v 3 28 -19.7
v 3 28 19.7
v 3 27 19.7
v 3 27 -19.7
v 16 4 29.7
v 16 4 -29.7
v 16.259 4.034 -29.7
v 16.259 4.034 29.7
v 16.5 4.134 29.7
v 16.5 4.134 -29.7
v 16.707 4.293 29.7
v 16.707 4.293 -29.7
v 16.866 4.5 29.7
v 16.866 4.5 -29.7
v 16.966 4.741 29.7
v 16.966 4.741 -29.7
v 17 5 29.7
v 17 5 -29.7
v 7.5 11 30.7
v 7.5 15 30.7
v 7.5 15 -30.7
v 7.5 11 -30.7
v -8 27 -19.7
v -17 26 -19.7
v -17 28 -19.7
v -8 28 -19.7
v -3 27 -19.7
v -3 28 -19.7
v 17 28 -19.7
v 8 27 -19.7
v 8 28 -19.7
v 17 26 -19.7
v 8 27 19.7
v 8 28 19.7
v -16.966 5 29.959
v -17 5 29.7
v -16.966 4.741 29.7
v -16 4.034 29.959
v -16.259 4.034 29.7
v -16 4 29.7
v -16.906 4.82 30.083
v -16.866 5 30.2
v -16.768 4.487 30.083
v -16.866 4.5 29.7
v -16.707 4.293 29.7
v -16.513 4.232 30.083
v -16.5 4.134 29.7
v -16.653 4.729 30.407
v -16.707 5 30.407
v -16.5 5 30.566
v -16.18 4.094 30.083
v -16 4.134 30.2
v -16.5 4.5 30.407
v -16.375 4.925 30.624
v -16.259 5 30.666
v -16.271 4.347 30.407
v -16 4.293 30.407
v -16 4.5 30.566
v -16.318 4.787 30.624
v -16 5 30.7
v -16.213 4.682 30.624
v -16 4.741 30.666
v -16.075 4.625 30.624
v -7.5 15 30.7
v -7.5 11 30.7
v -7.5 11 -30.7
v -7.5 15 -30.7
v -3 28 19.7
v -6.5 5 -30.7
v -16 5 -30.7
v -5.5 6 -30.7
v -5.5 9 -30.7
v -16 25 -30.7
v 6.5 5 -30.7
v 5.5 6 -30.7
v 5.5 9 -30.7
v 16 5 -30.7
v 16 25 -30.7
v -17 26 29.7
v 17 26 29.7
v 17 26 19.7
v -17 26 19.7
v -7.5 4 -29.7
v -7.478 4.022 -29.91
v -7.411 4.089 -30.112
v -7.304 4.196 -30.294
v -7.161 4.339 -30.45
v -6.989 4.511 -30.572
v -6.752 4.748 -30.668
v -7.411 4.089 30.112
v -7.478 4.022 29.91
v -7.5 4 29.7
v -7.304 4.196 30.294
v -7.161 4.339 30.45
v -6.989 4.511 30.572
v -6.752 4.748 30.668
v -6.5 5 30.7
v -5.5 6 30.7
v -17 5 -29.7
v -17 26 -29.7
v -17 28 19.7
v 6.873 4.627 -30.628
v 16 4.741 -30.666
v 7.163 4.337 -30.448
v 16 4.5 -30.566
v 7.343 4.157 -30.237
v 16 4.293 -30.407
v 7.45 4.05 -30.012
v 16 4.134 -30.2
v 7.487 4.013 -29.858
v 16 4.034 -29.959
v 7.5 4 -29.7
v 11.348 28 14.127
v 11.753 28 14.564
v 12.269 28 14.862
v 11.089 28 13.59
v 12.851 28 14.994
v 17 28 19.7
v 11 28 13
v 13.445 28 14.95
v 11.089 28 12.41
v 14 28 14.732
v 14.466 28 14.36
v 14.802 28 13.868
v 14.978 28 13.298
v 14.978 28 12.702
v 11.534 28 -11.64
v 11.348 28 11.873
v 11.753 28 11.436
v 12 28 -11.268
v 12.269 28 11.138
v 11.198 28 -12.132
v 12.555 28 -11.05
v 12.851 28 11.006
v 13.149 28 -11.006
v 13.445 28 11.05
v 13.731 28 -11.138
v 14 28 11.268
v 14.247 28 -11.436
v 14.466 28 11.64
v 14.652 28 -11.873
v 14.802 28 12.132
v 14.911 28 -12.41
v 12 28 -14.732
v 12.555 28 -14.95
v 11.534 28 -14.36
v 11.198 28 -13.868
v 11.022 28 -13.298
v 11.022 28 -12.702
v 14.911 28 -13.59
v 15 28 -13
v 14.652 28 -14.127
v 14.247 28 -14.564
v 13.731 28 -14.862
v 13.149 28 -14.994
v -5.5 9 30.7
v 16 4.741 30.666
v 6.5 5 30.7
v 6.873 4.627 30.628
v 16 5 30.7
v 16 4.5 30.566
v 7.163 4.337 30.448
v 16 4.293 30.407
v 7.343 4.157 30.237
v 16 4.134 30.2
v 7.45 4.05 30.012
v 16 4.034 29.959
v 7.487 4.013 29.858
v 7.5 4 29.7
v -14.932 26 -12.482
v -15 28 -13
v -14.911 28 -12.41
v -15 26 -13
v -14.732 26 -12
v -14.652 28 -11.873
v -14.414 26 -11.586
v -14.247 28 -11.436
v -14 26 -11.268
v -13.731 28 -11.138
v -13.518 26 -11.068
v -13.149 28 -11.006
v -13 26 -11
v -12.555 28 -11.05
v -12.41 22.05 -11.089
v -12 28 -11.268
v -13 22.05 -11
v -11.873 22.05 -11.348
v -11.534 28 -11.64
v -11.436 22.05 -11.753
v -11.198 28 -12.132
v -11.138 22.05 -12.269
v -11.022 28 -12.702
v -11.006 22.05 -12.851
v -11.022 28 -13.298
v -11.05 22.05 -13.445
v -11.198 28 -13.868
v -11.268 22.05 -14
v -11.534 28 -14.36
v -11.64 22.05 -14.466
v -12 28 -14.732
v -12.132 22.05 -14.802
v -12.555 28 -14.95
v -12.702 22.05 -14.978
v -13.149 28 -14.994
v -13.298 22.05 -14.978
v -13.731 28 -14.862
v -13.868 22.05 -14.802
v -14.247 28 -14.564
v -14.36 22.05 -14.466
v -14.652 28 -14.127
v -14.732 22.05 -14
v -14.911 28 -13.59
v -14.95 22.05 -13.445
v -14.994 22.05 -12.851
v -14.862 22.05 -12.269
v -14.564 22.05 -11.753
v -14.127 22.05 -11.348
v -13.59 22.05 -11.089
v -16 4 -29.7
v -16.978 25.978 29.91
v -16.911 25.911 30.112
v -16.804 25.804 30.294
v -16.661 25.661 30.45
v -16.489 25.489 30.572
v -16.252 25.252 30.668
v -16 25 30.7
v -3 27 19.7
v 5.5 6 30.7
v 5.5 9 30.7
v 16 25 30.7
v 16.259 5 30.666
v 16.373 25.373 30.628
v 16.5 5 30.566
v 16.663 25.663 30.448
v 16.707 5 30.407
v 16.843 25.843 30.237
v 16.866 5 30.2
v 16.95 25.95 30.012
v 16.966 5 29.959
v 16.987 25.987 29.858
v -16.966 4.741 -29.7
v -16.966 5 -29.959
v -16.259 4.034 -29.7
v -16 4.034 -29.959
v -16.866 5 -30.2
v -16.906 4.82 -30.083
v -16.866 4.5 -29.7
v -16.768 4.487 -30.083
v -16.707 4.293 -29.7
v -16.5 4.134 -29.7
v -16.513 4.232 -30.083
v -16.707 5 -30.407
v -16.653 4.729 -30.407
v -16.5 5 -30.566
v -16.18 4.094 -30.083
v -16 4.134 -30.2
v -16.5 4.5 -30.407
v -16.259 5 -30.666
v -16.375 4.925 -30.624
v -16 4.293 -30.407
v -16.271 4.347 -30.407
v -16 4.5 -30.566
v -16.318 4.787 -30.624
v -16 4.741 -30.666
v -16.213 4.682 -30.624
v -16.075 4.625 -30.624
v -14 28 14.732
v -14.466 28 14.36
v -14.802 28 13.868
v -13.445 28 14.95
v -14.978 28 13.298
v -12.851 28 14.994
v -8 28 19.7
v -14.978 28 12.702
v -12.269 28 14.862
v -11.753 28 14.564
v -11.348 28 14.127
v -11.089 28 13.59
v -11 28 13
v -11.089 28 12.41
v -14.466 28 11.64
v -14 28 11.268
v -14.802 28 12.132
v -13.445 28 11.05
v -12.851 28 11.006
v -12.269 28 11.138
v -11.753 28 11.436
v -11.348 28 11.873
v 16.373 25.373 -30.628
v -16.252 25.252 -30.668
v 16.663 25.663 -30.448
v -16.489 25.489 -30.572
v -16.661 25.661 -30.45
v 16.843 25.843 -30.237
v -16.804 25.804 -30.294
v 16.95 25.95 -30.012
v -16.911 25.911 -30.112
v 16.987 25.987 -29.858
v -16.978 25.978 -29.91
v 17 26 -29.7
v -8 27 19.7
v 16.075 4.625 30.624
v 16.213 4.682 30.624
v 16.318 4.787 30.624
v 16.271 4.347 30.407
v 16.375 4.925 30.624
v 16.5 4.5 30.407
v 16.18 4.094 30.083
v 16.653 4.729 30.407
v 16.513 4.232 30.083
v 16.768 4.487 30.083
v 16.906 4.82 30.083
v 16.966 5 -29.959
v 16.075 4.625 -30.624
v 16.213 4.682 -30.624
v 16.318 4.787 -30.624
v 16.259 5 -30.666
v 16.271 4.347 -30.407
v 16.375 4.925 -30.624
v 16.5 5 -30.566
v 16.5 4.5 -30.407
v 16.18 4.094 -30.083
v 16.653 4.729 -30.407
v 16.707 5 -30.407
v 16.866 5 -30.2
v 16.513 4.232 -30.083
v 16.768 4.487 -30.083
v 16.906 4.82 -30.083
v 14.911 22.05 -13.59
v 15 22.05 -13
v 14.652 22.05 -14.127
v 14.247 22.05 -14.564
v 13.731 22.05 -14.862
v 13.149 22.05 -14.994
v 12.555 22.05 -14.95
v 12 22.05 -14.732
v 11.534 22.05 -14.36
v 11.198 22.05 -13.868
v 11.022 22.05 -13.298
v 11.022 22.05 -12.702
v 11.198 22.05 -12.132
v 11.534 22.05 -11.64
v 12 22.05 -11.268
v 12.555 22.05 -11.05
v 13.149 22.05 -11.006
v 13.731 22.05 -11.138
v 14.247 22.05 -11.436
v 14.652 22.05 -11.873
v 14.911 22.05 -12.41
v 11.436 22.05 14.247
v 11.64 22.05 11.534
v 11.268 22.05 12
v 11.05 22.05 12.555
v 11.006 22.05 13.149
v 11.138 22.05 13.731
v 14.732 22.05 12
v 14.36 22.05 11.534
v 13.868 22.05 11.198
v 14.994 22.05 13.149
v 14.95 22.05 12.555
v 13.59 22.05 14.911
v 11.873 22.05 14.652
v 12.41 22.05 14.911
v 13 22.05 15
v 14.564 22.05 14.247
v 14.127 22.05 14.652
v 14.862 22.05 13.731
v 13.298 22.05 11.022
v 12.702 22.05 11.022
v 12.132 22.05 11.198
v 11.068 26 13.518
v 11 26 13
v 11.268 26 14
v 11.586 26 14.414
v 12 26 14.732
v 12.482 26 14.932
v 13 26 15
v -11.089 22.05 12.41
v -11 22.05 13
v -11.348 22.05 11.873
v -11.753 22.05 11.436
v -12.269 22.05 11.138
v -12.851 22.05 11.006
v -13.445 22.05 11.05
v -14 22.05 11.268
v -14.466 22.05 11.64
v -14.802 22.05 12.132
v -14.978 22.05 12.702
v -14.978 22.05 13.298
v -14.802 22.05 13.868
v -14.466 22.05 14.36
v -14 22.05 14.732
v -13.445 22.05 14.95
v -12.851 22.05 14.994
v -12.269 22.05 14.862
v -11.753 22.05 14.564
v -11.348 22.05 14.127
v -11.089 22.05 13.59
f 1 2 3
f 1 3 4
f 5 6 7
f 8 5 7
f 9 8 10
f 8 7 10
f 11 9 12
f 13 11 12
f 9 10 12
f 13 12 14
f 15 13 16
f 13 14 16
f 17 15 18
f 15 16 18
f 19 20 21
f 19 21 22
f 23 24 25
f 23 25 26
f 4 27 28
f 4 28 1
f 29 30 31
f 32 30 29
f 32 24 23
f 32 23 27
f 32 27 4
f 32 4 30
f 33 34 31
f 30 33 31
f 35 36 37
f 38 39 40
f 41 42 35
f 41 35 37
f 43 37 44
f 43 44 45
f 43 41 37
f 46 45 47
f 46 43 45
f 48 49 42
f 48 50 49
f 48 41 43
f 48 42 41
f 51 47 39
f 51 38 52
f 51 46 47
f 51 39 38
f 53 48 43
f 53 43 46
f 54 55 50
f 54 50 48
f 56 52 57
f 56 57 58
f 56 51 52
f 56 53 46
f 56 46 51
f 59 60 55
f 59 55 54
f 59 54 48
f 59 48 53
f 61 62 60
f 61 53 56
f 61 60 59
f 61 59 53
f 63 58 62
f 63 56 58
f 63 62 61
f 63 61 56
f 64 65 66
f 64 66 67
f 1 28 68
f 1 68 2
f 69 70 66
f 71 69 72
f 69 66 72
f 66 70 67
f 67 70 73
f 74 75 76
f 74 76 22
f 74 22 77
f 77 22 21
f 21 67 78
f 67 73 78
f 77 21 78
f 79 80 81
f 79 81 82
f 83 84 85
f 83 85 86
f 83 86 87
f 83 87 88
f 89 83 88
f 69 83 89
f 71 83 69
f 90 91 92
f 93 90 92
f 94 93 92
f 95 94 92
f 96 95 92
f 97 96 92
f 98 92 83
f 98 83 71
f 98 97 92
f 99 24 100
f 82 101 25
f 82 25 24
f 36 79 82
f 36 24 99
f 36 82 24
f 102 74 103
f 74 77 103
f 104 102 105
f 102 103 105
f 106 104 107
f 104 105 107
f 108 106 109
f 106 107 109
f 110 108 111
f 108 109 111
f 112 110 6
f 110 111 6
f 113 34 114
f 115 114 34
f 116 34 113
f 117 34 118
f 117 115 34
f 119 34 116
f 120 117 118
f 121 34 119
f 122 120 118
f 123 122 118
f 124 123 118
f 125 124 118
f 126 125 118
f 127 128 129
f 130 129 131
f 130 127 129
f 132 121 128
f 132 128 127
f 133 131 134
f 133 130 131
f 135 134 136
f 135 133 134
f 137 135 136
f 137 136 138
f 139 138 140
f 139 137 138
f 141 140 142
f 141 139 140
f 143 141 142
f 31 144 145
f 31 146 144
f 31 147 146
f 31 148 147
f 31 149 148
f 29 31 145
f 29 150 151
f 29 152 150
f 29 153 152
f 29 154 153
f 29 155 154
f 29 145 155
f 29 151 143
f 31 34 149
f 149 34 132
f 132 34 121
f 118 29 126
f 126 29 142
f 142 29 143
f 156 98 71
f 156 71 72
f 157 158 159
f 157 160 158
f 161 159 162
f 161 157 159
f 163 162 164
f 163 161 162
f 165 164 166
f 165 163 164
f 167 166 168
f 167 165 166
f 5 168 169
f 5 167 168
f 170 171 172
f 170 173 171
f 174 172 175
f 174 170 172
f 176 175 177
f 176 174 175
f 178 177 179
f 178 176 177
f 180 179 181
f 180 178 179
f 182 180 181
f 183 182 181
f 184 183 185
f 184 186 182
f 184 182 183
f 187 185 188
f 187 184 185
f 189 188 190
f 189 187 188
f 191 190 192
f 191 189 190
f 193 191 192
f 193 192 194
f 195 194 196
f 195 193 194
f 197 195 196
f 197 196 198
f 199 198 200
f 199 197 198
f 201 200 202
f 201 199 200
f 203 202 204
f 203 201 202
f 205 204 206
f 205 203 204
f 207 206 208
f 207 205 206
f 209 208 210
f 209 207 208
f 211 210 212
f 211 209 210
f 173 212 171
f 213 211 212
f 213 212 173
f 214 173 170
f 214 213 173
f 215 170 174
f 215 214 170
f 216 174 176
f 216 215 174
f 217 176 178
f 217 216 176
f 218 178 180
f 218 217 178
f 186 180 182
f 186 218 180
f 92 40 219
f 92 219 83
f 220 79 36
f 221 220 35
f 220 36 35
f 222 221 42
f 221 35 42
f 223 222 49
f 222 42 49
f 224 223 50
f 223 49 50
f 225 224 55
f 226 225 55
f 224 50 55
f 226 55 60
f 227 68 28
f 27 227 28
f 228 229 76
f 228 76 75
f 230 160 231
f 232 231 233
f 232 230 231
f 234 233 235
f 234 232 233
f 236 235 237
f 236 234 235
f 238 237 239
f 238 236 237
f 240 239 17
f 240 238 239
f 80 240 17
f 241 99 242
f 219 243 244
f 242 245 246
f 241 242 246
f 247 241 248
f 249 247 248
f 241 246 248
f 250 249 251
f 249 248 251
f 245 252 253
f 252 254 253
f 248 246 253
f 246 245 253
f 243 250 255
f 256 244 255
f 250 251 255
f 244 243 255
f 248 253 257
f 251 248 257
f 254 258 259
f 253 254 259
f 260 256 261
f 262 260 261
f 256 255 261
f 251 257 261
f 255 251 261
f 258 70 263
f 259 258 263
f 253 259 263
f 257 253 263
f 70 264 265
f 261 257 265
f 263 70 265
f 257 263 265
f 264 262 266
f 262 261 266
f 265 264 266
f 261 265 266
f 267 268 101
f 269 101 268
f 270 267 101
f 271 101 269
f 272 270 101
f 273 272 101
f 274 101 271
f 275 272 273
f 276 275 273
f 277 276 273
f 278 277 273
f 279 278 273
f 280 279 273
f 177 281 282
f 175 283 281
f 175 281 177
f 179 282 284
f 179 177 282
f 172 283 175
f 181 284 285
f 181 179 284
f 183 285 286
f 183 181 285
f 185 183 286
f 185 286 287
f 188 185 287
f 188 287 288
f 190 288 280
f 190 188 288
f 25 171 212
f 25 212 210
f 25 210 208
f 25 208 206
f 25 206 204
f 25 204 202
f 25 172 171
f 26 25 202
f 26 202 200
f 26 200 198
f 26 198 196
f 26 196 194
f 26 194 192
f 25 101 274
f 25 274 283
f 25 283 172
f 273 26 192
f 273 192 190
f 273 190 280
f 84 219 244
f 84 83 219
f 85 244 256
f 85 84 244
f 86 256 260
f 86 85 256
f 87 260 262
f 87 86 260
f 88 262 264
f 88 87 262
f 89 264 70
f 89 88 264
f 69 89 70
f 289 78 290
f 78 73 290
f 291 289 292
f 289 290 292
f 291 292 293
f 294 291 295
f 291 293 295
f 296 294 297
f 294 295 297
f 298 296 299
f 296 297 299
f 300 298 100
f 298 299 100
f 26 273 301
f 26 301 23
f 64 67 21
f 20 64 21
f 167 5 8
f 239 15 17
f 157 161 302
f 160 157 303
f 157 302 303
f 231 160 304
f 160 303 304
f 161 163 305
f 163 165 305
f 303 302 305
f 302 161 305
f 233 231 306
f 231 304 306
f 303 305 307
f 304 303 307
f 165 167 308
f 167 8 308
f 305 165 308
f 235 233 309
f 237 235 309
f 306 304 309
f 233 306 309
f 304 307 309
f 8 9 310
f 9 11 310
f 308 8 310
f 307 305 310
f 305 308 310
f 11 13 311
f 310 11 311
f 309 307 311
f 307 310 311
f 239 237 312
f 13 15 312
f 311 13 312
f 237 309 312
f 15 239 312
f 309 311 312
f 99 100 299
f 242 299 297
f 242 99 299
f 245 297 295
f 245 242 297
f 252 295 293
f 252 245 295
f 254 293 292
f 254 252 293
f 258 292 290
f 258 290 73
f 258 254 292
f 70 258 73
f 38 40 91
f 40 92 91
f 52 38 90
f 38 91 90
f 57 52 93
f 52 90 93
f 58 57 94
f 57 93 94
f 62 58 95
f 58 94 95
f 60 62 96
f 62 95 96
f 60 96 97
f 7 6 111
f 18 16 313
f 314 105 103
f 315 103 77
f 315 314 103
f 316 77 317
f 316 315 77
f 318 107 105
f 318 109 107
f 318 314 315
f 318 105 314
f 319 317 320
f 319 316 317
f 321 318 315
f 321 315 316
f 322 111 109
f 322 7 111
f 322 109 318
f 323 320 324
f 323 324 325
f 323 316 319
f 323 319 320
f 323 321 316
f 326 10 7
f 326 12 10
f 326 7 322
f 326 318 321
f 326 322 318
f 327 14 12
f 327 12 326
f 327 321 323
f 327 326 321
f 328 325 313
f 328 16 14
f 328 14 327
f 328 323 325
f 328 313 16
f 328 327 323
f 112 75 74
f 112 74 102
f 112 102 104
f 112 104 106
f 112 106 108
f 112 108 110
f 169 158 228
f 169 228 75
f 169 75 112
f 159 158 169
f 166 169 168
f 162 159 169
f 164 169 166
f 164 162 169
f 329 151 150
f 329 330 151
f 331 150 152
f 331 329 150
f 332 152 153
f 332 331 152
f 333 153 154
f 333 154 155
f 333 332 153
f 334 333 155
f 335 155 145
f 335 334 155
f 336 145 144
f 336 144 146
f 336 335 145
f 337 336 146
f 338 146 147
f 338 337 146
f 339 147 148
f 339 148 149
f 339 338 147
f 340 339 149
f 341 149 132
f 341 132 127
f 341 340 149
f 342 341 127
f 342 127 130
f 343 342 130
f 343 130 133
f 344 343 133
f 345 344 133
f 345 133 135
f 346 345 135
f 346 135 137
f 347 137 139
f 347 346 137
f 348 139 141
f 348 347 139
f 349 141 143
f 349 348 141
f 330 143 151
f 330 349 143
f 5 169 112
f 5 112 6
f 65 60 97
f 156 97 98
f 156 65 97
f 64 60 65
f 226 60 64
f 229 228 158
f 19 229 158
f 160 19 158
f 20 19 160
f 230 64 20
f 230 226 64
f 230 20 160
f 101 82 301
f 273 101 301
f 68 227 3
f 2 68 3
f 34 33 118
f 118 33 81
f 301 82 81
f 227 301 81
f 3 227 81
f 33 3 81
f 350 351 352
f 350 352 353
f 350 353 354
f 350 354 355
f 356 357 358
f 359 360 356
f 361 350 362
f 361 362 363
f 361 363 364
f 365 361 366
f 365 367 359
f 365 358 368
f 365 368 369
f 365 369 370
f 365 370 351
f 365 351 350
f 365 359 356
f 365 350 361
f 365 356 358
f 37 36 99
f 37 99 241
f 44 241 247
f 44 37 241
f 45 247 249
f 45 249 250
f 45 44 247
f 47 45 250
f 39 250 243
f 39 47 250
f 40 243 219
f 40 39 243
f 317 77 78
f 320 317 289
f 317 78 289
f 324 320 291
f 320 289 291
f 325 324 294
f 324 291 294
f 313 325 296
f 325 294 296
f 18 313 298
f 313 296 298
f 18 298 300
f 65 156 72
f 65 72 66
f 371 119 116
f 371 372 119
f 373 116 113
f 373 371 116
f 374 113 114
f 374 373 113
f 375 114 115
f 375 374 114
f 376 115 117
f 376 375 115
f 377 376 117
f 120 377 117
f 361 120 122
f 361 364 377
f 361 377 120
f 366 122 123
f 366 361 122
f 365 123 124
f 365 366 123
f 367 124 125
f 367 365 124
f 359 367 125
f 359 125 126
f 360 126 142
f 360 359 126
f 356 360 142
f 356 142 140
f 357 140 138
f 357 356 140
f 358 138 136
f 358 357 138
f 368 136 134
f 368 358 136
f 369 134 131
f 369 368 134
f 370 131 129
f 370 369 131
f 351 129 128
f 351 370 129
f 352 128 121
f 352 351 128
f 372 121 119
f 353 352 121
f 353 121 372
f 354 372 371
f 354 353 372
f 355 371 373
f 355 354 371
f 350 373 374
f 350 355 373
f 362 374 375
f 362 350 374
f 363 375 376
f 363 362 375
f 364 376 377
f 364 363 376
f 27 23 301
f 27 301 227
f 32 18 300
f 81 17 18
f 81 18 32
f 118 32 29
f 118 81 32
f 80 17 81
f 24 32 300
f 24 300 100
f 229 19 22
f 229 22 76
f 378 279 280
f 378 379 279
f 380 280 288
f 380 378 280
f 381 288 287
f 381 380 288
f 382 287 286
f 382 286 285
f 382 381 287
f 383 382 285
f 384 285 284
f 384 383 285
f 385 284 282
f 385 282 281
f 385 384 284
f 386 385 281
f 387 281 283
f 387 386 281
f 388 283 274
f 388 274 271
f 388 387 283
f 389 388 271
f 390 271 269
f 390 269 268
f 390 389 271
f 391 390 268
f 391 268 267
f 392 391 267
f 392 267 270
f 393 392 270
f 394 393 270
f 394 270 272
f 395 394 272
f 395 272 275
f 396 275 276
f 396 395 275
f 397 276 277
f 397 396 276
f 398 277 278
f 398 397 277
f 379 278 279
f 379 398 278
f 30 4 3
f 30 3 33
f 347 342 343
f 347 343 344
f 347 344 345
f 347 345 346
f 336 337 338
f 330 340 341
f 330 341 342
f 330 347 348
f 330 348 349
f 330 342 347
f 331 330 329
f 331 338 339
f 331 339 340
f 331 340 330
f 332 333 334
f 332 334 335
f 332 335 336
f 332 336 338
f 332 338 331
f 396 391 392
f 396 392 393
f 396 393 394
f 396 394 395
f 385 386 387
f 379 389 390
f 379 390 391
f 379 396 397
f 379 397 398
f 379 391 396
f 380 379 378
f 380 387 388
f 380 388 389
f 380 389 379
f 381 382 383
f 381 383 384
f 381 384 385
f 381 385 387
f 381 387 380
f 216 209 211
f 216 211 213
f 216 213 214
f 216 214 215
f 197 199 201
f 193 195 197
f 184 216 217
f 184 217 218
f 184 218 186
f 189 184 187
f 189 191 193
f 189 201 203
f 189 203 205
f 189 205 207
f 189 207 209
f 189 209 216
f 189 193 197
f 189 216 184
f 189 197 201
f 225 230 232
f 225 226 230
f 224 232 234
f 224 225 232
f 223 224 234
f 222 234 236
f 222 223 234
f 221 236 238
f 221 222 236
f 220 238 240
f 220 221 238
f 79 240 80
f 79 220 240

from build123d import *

# Parameters (mm, degrees)
BOSS_EXTRUDE1_DEPTH = 30.7
SKETCH4_W           = 34
SKETCH4_H           = 39.4
SKETCH4_R           = 2
BOSS_EXTRUDE2_DEPTH = 2
SKETCH5_W           = 5
SKETCH5_H           = 39.4
CUT_EXTRUDE1_DEPTH  = 1
FILLET1_R           = 1
FILLET2_R           = 1
CUT_EXTRUDE2_START  = -5.95
SKETCH6_R           = 2
CUT_EXTRUDE2_DEPTH  = 5.95


with BuildPart() as part:
    # Sketch1 → Boss-Extrude1 (new, symmetric)
    with BuildSketch(Plane.XY):
        Polygon((0, 15), (0, 26), (-17, 26), (-17, 4), (-7.5, 4), (-5.5, 6), (-5.5, 9), (-7.5, 11), (-7.5, 15), align=None)
        Polygon((17, 26), (0, 26), (0, 15), (7.5, 15), (7.5, 11), (5.5, 9), (5.5, 6), (7.5, 4), (17, 4), align=None)
    extrude(amount=BOSS_EXTRUDE1_DEPTH, both=True)

    # Sketch4 → Boss-Extrude2 (add)
    with BuildSketch(Plane(origin=(0, 26, 0), x_dir=(1, 0, 0), z_dir=(0, 1, 0))):
        Rectangle(SKETCH4_W, SKETCH4_H)
        with Locations(Location((-13, 13, 0), (0, 0, 180))):
            Circle(SKETCH4_R, mode=Mode.SUBTRACT)
        with Locations((13, 13)):
            Circle(SKETCH4_R, mode=Mode.SUBTRACT)
        with Locations((-13, -13)):
            Circle(SKETCH4_R, mode=Mode.SUBTRACT)
        with Locations(Location((13, -13, 0), (0, 0, 180))):
            Circle(SKETCH4_R, mode=Mode.SUBTRACT)
    extrude(amount=BOSS_EXTRUDE2_DEPTH)

    # Sketch5 → Cut-Extrude1 (cut)
    with BuildSketch(Plane(origin=(0, 28, 0), x_dir=(1, 0, 0), z_dir=(0, 1, 0))):
        with Locations((-5.5, 0)):
            Rectangle(SKETCH5_W, SKETCH5_H)
        with Locations((5.5, 0)):
            Rectangle(SKETCH5_W, SKETCH5_H)
    extrude(amount=-CUT_EXTRUDE1_DEPTH, mode=Mode.SUBTRACT)

    # Fillet1
    fillet1_edges = [part.edges().sort_by_distance(p)[0] for p in [
        (-17, 4, 0),
        (17, 4, 0),
    ]]
    fillet(fillet1_edges, radius=FILLET1_R)

    # Fillet2
    fillet2_edges = [part.edges().sort_by_distance(p)[0] for p in [
        (-17, 15.5, -30.7),
        (17, 15.5, -30.7),
        (16.707106781, 4.292893219, -30.7),
        (-16.707106781, 4.292893219, -30.7),
        (-17, 15.5, 30.7),
        (17, 15.5, 30.7),
        (16.707106781, 4.292893219, 30.7),
        (-16.707106781, 4.292893219, 30.7),
        (-11.75, 4, -30.7),
        (0, 26, -30.7),
        (11.75, 4, -30.7),
        (11.75, 4, 30.7),
        (0, 26, 30.7),
        (-11.75, 4, 30.7),
    ]]
    fillet(fillet2_edges, radius=FILLET2_R)

    # Sketch6 → Cut-Extrude2 (cut)
    with BuildSketch(Plane(origin=(0, 28, 0), x_dir=(1, 0, 0), z_dir=(0, 1, 0)).offset(CUT_EXTRUDE2_START)):
        with Locations((-13, -13)):
            Circle(SKETCH6_R)
        with Locations(Location((13, -13, 0), (0, 0, 270))):
            Circle(SKETCH6_R)
        with Locations((13, 13)):
            Circle(SKETCH6_R)
        with Locations(Location((-13, 13, 0), (0, 0, 270))):
            Circle(SKETCH6_R)
    extrude(amount=CUT_EXTRUDE2_DEPTH, mode=Mode.SUBTRACT)


solid = part.part
